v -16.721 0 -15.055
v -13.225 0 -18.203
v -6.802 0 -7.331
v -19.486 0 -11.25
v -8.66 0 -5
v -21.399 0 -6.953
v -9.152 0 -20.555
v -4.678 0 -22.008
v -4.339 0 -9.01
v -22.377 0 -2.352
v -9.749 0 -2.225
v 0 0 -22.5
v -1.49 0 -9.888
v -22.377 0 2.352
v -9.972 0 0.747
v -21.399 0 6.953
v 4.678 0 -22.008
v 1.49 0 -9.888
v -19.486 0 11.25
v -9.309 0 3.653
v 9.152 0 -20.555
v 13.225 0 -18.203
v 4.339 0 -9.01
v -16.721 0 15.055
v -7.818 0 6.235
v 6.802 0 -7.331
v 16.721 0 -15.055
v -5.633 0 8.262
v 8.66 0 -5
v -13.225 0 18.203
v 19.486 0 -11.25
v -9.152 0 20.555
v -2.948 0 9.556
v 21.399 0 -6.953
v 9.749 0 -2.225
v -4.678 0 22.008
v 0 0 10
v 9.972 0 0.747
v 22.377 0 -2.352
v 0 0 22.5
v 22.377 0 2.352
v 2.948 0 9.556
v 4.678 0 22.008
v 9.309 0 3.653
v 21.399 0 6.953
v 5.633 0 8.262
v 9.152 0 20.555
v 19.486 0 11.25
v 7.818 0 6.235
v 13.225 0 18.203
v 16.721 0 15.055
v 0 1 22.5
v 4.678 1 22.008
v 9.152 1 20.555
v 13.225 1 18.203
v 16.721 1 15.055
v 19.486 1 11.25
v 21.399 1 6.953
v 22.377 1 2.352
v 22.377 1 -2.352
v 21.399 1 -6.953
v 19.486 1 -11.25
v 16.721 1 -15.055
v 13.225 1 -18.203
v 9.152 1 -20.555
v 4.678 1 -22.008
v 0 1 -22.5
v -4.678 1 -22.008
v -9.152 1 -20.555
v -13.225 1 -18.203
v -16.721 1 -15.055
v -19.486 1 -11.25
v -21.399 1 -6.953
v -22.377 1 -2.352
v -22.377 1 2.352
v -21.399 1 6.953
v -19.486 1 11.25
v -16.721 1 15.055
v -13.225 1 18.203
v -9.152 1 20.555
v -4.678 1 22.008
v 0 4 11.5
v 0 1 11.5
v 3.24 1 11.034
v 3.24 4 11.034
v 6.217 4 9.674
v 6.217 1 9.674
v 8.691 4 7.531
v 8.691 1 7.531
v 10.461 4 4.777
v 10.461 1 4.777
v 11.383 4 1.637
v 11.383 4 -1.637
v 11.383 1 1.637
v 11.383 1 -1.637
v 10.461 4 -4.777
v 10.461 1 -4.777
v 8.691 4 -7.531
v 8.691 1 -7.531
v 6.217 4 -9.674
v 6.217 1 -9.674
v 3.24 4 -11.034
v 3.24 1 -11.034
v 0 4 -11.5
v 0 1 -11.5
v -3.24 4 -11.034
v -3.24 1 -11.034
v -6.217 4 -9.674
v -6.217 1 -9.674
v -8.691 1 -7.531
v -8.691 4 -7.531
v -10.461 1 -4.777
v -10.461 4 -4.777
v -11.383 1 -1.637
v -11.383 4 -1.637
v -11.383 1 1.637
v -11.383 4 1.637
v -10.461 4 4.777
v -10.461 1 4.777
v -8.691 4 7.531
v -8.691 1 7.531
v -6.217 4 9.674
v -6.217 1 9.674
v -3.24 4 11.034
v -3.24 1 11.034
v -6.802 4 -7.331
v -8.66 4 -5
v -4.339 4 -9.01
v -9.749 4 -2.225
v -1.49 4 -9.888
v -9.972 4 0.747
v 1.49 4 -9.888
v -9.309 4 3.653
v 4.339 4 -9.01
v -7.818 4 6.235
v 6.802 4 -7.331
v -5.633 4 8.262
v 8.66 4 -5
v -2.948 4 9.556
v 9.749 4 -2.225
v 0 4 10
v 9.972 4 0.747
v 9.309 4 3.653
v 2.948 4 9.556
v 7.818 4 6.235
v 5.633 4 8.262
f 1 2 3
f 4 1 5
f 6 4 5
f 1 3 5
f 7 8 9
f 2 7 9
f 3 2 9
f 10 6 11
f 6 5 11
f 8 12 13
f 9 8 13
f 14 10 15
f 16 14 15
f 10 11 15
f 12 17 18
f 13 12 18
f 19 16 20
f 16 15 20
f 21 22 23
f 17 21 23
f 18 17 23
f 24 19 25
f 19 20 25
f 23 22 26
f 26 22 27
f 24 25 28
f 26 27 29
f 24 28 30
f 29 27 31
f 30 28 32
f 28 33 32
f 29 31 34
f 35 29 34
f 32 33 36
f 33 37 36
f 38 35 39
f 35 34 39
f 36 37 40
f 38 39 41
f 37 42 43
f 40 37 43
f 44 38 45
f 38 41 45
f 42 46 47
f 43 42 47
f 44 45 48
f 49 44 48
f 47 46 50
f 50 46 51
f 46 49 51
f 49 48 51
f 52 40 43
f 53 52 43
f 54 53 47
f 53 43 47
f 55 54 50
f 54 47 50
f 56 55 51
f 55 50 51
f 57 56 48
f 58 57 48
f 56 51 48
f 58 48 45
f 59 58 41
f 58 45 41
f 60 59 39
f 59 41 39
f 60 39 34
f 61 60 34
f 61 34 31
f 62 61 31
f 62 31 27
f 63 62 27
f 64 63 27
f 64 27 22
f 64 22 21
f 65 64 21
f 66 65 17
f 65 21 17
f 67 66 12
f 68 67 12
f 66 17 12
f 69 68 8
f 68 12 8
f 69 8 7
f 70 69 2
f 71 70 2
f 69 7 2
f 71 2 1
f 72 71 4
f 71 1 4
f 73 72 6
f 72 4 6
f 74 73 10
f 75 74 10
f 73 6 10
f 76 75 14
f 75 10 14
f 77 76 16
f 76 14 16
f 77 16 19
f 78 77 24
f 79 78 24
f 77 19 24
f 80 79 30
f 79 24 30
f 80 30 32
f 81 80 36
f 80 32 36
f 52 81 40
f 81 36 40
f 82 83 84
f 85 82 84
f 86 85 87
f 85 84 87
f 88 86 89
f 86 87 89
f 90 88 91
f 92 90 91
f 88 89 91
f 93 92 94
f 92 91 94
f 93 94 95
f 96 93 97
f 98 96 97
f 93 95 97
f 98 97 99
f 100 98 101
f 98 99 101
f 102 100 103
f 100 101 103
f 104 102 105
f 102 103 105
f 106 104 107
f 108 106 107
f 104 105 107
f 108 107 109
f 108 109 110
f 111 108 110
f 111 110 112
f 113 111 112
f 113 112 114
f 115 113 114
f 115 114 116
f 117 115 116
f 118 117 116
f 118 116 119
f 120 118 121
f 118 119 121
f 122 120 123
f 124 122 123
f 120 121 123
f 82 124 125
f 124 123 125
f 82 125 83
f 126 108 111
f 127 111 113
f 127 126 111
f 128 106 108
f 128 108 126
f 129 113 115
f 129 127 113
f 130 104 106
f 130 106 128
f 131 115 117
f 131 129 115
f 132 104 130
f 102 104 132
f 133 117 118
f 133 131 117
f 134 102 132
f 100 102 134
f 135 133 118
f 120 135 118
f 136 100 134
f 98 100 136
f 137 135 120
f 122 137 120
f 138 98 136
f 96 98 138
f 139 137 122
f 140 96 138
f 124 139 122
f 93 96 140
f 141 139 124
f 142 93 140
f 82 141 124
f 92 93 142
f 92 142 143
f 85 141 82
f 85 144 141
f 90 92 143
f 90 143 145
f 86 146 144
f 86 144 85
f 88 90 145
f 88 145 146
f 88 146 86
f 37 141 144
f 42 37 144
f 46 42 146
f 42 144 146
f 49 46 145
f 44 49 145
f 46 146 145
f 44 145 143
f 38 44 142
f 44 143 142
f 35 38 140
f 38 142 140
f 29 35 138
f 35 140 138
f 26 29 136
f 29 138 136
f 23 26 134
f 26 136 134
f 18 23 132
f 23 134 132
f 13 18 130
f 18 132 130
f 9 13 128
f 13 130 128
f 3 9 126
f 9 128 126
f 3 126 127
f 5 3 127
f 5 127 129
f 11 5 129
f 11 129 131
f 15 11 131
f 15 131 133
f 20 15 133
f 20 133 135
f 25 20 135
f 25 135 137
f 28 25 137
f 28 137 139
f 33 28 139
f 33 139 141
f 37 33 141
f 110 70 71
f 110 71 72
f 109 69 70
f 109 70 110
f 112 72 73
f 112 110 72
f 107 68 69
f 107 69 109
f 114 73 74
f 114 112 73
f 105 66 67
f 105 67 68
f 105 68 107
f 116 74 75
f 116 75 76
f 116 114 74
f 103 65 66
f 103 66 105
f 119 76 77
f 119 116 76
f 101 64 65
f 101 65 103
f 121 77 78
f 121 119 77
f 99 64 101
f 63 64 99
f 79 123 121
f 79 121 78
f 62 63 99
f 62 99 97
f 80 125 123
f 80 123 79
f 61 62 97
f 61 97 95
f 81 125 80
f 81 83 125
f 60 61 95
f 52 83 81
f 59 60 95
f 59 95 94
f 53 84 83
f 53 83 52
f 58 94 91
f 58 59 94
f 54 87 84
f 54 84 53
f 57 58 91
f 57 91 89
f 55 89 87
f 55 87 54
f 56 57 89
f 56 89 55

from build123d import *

# Parameters (mm, degrees)
ESQUISSE4_R             = 22.5
ESQUISSE4_R_2           = 10
BOSS_EXTRU_1_DEPTH      = 1
ESQUISSE5_R             = 11.5
BOSS_EXTRU_2_DEPTH      = 3
ENL_V_MAT_EXTRU_1_REACH = 6
ESQUISSE6_R             = 10


with BuildPart() as part:
    # Esquisse4 → Boss.-Extru.1 (new body)
    with BuildSketch(Plane(origin=(0, 0, 0), x_dir=(1, 0, 0), z_dir=(0, 1, 0))):
        with Locations(Location((0, 0, 0), (0, 0, 270))):  # turned: the seam where the file's is
            Circle(ESQUISSE4_R)
        with Locations(Location((0, 0, 0), (0, 0, 270))):  # turned: the seam where the file's is
            Circle(ESQUISSE4_R_2, mode=Mode.SUBTRACT)
    extrude(amount=BOSS_EXTRU_1_DEPTH)

    # Esquisse5 → Boss.-Extru.2 (add)
    with BuildSketch(Plane(origin=(0, 1, 0), x_dir=(1, 0, 0), z_dir=(0, 1, 0))):
        with Locations(Location((0, 0, 0), (0, 0, 270))):  # turned: the seam where the file's is
            Circle(ESQUISSE5_R)
    extrude(amount=BOSS_EXTRU_2_DEPTH)

    # Esquisse6 → Enlèv. mat.-Extru.1 (cut, up to next)
    with BuildSketch(Plane(origin=(0, 4, 0), x_dir=(1, 0, 0), z_dir=(0, 1, 0)), mode=Mode.PRIVATE) as enl_v_mat_extru_1_sk1:
        with Locations(Location((0, 0, 0), (0, 0, 270))):  # turned: the seam where the file's is
            Circle(ESQUISSE6_R)
    enl_v_mat_extru_1_tool1 = extrude(enl_v_mat_extru_1_sk1.sketch, amount=-ENL_V_MAT_EXTRU_1_REACH, mode=Mode.PRIVATE) & part.part
    add(enl_v_mat_extru_1_tool1.solids().sort_by_distance((0, 4, 0))[0], mode=Mode.SUBTRACT)


solid = part.part
